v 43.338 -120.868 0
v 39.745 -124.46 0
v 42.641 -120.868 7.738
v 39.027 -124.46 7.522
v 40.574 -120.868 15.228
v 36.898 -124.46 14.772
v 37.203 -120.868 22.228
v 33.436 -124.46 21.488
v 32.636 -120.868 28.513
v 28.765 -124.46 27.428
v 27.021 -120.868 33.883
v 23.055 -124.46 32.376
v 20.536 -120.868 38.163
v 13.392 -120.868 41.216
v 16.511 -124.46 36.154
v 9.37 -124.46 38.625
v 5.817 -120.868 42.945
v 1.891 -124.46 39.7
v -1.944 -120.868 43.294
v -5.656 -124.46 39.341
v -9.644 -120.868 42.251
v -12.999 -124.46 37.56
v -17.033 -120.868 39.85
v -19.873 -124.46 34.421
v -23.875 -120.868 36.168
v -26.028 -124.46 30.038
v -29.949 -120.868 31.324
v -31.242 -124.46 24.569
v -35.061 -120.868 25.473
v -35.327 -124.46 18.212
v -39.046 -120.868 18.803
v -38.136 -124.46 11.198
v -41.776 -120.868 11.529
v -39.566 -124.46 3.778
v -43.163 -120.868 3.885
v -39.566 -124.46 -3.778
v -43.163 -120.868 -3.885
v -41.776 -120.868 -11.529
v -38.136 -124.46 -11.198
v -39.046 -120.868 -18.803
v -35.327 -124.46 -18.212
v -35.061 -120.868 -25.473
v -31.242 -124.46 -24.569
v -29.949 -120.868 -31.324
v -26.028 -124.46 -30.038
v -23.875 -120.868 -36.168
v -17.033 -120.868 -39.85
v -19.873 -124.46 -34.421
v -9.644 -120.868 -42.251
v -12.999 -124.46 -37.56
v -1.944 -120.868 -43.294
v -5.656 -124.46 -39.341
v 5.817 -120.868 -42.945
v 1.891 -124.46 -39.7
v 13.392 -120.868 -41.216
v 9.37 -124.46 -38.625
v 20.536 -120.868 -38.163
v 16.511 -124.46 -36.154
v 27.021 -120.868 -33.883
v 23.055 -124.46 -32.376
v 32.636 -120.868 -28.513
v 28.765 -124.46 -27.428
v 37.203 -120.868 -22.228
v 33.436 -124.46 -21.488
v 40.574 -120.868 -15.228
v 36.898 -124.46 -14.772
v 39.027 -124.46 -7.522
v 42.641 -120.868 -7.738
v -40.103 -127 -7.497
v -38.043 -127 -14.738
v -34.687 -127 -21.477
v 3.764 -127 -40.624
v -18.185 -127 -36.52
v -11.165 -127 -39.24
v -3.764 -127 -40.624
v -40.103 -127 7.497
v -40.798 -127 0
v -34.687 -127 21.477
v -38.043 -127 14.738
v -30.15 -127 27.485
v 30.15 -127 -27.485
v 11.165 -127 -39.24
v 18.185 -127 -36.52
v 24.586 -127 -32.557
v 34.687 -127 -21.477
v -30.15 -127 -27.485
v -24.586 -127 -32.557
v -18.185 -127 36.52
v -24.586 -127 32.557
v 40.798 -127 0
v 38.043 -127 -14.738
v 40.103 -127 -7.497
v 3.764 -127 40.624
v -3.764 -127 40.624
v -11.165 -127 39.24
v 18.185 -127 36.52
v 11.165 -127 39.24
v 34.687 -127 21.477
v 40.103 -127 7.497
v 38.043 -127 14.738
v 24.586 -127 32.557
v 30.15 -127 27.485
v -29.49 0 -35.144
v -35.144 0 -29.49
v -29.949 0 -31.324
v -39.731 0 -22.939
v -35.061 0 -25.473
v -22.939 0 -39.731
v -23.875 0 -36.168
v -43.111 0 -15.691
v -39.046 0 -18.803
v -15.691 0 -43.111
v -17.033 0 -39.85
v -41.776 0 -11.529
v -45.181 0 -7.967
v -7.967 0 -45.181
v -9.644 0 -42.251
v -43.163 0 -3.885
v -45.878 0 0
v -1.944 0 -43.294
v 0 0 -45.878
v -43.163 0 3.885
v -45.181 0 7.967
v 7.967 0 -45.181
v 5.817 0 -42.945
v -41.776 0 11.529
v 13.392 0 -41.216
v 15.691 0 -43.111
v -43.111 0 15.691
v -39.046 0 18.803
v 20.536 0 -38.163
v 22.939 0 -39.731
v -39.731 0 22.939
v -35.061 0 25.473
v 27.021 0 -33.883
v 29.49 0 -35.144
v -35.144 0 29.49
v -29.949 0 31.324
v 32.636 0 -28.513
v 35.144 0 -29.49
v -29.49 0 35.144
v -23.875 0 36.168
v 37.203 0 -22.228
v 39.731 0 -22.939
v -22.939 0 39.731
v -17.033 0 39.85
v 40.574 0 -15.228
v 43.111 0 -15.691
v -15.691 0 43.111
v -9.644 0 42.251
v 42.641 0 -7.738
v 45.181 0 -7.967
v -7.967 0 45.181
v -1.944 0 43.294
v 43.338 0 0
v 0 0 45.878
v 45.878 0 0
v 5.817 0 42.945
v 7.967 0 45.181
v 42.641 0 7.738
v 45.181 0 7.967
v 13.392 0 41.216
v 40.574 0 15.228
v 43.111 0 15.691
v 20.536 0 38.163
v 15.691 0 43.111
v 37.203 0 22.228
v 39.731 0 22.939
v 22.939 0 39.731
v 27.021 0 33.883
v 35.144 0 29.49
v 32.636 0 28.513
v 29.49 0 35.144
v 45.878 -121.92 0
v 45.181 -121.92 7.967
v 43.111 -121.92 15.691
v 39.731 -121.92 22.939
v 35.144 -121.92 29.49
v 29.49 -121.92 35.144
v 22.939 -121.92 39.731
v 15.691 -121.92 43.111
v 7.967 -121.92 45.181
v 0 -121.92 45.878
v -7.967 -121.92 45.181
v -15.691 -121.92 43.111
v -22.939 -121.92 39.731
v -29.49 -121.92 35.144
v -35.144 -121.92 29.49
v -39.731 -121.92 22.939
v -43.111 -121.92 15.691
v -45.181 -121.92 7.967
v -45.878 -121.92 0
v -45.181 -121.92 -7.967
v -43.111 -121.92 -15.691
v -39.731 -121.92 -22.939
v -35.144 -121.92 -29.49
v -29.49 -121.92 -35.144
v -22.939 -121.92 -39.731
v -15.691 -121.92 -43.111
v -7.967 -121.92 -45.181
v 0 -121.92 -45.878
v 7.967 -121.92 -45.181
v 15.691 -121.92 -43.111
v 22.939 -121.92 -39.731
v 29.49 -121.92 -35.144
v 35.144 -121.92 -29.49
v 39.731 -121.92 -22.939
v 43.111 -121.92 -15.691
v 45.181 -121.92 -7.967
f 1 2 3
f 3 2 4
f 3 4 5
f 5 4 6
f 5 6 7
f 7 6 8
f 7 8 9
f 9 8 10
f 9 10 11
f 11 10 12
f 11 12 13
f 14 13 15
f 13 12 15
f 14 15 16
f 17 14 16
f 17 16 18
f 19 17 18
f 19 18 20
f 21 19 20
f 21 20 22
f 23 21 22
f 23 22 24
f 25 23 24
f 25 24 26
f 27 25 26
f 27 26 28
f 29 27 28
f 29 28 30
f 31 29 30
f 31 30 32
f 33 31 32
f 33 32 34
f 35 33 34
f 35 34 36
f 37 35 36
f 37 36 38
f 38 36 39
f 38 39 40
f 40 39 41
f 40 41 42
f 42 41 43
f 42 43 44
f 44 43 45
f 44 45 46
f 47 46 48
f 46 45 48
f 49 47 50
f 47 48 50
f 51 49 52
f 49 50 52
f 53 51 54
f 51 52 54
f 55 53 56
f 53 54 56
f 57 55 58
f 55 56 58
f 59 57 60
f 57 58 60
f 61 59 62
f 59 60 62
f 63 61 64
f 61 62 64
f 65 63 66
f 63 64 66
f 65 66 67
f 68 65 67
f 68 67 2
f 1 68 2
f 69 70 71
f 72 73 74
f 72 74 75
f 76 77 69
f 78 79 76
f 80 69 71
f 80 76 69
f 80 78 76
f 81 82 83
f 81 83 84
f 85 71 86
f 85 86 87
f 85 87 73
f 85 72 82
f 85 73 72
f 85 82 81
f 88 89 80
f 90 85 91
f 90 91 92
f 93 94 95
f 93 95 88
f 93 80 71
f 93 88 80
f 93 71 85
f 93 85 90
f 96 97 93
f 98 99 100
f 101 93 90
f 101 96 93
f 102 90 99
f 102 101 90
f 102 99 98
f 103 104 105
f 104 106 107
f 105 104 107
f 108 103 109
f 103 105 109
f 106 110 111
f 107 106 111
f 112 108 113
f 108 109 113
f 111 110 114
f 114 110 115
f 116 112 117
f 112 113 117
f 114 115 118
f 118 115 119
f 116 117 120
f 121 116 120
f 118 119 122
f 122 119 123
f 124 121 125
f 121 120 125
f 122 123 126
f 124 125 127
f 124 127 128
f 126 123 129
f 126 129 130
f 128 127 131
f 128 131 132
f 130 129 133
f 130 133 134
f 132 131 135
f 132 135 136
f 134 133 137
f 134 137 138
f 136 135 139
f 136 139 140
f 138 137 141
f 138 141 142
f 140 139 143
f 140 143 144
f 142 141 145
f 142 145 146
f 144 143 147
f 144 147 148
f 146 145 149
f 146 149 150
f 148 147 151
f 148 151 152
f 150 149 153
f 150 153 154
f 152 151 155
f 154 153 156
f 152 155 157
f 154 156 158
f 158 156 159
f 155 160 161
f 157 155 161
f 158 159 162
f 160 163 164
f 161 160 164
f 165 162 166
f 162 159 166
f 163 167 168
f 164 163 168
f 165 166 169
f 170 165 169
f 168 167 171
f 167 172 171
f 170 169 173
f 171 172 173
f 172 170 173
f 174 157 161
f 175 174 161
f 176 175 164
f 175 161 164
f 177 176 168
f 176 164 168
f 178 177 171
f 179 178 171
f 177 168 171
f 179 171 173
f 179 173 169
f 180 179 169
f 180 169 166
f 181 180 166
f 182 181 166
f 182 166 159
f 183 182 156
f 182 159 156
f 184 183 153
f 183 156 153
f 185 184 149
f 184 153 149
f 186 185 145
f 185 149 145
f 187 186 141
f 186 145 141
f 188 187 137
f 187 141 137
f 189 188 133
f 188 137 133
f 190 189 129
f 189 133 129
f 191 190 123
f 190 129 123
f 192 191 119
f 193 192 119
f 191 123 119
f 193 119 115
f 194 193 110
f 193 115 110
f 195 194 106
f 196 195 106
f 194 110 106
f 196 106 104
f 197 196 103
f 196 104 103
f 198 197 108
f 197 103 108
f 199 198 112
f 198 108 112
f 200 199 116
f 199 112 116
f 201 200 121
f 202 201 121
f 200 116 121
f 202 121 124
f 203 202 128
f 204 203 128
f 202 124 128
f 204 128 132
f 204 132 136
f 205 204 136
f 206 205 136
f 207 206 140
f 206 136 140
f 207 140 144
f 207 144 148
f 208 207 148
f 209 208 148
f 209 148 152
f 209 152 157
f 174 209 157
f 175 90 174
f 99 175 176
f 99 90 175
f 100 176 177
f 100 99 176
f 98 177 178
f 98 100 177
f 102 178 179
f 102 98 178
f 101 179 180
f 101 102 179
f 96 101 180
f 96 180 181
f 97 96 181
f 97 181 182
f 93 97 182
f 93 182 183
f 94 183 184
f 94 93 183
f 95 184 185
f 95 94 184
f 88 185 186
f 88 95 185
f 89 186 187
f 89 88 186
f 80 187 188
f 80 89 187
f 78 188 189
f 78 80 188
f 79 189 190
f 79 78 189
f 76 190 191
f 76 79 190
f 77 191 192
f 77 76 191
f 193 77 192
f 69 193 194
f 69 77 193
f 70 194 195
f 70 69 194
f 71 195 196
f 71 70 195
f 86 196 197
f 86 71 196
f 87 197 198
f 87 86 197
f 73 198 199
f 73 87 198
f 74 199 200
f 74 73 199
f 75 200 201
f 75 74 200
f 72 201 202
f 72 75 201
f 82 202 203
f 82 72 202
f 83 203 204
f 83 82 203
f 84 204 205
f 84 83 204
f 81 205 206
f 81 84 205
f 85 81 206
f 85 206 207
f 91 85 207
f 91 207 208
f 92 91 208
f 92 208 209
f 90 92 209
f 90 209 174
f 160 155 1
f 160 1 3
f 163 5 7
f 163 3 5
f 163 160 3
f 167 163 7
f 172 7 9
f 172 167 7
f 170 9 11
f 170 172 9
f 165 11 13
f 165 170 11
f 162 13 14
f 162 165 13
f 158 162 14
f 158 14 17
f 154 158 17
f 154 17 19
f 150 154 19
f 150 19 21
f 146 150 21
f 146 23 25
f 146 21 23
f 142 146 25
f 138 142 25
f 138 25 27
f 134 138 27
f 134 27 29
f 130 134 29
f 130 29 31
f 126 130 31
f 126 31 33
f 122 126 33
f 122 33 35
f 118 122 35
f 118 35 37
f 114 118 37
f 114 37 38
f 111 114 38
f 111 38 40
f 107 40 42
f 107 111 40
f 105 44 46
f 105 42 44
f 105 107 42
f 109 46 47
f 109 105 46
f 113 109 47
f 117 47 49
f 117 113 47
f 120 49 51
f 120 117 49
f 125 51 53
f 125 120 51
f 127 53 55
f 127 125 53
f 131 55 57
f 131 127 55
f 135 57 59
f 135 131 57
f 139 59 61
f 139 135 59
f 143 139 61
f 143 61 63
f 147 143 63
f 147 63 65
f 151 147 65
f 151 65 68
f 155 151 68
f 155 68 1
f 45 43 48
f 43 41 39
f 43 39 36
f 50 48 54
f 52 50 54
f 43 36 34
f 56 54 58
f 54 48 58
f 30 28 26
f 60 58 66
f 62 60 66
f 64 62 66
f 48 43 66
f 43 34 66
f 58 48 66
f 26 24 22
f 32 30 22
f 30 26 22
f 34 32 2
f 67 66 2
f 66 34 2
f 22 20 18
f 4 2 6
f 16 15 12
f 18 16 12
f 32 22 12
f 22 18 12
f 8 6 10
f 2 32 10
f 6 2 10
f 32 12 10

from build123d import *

# Parameters (mm, degrees)
F0_R     = 45.877581
F1_DEPTH = 127
F2_SIZE  = 5.08
F3_T     = -2.54


with BuildPart() as f1:
    # F0 (on Front) → F1 (new body)
    with BuildSketch(Plane.XZ):
        Circle(F0_R)
    extrude(amount=F1_DEPTH)

    # F2
    f2_edges = [f1.edges().sort_by_distance(p)[0] for p in [
        (-45.877581, -127, 0),
    ]]
    chamfer(f2_edges, length=F2_SIZE)

    # F3
    f3_openings = [f1.faces().sort_by_distance(p)[0] for p in [
        (0, 0, 0),
    ]]
    offset(amount=F3_T, openings=f3_openings)


solid = f1.part
